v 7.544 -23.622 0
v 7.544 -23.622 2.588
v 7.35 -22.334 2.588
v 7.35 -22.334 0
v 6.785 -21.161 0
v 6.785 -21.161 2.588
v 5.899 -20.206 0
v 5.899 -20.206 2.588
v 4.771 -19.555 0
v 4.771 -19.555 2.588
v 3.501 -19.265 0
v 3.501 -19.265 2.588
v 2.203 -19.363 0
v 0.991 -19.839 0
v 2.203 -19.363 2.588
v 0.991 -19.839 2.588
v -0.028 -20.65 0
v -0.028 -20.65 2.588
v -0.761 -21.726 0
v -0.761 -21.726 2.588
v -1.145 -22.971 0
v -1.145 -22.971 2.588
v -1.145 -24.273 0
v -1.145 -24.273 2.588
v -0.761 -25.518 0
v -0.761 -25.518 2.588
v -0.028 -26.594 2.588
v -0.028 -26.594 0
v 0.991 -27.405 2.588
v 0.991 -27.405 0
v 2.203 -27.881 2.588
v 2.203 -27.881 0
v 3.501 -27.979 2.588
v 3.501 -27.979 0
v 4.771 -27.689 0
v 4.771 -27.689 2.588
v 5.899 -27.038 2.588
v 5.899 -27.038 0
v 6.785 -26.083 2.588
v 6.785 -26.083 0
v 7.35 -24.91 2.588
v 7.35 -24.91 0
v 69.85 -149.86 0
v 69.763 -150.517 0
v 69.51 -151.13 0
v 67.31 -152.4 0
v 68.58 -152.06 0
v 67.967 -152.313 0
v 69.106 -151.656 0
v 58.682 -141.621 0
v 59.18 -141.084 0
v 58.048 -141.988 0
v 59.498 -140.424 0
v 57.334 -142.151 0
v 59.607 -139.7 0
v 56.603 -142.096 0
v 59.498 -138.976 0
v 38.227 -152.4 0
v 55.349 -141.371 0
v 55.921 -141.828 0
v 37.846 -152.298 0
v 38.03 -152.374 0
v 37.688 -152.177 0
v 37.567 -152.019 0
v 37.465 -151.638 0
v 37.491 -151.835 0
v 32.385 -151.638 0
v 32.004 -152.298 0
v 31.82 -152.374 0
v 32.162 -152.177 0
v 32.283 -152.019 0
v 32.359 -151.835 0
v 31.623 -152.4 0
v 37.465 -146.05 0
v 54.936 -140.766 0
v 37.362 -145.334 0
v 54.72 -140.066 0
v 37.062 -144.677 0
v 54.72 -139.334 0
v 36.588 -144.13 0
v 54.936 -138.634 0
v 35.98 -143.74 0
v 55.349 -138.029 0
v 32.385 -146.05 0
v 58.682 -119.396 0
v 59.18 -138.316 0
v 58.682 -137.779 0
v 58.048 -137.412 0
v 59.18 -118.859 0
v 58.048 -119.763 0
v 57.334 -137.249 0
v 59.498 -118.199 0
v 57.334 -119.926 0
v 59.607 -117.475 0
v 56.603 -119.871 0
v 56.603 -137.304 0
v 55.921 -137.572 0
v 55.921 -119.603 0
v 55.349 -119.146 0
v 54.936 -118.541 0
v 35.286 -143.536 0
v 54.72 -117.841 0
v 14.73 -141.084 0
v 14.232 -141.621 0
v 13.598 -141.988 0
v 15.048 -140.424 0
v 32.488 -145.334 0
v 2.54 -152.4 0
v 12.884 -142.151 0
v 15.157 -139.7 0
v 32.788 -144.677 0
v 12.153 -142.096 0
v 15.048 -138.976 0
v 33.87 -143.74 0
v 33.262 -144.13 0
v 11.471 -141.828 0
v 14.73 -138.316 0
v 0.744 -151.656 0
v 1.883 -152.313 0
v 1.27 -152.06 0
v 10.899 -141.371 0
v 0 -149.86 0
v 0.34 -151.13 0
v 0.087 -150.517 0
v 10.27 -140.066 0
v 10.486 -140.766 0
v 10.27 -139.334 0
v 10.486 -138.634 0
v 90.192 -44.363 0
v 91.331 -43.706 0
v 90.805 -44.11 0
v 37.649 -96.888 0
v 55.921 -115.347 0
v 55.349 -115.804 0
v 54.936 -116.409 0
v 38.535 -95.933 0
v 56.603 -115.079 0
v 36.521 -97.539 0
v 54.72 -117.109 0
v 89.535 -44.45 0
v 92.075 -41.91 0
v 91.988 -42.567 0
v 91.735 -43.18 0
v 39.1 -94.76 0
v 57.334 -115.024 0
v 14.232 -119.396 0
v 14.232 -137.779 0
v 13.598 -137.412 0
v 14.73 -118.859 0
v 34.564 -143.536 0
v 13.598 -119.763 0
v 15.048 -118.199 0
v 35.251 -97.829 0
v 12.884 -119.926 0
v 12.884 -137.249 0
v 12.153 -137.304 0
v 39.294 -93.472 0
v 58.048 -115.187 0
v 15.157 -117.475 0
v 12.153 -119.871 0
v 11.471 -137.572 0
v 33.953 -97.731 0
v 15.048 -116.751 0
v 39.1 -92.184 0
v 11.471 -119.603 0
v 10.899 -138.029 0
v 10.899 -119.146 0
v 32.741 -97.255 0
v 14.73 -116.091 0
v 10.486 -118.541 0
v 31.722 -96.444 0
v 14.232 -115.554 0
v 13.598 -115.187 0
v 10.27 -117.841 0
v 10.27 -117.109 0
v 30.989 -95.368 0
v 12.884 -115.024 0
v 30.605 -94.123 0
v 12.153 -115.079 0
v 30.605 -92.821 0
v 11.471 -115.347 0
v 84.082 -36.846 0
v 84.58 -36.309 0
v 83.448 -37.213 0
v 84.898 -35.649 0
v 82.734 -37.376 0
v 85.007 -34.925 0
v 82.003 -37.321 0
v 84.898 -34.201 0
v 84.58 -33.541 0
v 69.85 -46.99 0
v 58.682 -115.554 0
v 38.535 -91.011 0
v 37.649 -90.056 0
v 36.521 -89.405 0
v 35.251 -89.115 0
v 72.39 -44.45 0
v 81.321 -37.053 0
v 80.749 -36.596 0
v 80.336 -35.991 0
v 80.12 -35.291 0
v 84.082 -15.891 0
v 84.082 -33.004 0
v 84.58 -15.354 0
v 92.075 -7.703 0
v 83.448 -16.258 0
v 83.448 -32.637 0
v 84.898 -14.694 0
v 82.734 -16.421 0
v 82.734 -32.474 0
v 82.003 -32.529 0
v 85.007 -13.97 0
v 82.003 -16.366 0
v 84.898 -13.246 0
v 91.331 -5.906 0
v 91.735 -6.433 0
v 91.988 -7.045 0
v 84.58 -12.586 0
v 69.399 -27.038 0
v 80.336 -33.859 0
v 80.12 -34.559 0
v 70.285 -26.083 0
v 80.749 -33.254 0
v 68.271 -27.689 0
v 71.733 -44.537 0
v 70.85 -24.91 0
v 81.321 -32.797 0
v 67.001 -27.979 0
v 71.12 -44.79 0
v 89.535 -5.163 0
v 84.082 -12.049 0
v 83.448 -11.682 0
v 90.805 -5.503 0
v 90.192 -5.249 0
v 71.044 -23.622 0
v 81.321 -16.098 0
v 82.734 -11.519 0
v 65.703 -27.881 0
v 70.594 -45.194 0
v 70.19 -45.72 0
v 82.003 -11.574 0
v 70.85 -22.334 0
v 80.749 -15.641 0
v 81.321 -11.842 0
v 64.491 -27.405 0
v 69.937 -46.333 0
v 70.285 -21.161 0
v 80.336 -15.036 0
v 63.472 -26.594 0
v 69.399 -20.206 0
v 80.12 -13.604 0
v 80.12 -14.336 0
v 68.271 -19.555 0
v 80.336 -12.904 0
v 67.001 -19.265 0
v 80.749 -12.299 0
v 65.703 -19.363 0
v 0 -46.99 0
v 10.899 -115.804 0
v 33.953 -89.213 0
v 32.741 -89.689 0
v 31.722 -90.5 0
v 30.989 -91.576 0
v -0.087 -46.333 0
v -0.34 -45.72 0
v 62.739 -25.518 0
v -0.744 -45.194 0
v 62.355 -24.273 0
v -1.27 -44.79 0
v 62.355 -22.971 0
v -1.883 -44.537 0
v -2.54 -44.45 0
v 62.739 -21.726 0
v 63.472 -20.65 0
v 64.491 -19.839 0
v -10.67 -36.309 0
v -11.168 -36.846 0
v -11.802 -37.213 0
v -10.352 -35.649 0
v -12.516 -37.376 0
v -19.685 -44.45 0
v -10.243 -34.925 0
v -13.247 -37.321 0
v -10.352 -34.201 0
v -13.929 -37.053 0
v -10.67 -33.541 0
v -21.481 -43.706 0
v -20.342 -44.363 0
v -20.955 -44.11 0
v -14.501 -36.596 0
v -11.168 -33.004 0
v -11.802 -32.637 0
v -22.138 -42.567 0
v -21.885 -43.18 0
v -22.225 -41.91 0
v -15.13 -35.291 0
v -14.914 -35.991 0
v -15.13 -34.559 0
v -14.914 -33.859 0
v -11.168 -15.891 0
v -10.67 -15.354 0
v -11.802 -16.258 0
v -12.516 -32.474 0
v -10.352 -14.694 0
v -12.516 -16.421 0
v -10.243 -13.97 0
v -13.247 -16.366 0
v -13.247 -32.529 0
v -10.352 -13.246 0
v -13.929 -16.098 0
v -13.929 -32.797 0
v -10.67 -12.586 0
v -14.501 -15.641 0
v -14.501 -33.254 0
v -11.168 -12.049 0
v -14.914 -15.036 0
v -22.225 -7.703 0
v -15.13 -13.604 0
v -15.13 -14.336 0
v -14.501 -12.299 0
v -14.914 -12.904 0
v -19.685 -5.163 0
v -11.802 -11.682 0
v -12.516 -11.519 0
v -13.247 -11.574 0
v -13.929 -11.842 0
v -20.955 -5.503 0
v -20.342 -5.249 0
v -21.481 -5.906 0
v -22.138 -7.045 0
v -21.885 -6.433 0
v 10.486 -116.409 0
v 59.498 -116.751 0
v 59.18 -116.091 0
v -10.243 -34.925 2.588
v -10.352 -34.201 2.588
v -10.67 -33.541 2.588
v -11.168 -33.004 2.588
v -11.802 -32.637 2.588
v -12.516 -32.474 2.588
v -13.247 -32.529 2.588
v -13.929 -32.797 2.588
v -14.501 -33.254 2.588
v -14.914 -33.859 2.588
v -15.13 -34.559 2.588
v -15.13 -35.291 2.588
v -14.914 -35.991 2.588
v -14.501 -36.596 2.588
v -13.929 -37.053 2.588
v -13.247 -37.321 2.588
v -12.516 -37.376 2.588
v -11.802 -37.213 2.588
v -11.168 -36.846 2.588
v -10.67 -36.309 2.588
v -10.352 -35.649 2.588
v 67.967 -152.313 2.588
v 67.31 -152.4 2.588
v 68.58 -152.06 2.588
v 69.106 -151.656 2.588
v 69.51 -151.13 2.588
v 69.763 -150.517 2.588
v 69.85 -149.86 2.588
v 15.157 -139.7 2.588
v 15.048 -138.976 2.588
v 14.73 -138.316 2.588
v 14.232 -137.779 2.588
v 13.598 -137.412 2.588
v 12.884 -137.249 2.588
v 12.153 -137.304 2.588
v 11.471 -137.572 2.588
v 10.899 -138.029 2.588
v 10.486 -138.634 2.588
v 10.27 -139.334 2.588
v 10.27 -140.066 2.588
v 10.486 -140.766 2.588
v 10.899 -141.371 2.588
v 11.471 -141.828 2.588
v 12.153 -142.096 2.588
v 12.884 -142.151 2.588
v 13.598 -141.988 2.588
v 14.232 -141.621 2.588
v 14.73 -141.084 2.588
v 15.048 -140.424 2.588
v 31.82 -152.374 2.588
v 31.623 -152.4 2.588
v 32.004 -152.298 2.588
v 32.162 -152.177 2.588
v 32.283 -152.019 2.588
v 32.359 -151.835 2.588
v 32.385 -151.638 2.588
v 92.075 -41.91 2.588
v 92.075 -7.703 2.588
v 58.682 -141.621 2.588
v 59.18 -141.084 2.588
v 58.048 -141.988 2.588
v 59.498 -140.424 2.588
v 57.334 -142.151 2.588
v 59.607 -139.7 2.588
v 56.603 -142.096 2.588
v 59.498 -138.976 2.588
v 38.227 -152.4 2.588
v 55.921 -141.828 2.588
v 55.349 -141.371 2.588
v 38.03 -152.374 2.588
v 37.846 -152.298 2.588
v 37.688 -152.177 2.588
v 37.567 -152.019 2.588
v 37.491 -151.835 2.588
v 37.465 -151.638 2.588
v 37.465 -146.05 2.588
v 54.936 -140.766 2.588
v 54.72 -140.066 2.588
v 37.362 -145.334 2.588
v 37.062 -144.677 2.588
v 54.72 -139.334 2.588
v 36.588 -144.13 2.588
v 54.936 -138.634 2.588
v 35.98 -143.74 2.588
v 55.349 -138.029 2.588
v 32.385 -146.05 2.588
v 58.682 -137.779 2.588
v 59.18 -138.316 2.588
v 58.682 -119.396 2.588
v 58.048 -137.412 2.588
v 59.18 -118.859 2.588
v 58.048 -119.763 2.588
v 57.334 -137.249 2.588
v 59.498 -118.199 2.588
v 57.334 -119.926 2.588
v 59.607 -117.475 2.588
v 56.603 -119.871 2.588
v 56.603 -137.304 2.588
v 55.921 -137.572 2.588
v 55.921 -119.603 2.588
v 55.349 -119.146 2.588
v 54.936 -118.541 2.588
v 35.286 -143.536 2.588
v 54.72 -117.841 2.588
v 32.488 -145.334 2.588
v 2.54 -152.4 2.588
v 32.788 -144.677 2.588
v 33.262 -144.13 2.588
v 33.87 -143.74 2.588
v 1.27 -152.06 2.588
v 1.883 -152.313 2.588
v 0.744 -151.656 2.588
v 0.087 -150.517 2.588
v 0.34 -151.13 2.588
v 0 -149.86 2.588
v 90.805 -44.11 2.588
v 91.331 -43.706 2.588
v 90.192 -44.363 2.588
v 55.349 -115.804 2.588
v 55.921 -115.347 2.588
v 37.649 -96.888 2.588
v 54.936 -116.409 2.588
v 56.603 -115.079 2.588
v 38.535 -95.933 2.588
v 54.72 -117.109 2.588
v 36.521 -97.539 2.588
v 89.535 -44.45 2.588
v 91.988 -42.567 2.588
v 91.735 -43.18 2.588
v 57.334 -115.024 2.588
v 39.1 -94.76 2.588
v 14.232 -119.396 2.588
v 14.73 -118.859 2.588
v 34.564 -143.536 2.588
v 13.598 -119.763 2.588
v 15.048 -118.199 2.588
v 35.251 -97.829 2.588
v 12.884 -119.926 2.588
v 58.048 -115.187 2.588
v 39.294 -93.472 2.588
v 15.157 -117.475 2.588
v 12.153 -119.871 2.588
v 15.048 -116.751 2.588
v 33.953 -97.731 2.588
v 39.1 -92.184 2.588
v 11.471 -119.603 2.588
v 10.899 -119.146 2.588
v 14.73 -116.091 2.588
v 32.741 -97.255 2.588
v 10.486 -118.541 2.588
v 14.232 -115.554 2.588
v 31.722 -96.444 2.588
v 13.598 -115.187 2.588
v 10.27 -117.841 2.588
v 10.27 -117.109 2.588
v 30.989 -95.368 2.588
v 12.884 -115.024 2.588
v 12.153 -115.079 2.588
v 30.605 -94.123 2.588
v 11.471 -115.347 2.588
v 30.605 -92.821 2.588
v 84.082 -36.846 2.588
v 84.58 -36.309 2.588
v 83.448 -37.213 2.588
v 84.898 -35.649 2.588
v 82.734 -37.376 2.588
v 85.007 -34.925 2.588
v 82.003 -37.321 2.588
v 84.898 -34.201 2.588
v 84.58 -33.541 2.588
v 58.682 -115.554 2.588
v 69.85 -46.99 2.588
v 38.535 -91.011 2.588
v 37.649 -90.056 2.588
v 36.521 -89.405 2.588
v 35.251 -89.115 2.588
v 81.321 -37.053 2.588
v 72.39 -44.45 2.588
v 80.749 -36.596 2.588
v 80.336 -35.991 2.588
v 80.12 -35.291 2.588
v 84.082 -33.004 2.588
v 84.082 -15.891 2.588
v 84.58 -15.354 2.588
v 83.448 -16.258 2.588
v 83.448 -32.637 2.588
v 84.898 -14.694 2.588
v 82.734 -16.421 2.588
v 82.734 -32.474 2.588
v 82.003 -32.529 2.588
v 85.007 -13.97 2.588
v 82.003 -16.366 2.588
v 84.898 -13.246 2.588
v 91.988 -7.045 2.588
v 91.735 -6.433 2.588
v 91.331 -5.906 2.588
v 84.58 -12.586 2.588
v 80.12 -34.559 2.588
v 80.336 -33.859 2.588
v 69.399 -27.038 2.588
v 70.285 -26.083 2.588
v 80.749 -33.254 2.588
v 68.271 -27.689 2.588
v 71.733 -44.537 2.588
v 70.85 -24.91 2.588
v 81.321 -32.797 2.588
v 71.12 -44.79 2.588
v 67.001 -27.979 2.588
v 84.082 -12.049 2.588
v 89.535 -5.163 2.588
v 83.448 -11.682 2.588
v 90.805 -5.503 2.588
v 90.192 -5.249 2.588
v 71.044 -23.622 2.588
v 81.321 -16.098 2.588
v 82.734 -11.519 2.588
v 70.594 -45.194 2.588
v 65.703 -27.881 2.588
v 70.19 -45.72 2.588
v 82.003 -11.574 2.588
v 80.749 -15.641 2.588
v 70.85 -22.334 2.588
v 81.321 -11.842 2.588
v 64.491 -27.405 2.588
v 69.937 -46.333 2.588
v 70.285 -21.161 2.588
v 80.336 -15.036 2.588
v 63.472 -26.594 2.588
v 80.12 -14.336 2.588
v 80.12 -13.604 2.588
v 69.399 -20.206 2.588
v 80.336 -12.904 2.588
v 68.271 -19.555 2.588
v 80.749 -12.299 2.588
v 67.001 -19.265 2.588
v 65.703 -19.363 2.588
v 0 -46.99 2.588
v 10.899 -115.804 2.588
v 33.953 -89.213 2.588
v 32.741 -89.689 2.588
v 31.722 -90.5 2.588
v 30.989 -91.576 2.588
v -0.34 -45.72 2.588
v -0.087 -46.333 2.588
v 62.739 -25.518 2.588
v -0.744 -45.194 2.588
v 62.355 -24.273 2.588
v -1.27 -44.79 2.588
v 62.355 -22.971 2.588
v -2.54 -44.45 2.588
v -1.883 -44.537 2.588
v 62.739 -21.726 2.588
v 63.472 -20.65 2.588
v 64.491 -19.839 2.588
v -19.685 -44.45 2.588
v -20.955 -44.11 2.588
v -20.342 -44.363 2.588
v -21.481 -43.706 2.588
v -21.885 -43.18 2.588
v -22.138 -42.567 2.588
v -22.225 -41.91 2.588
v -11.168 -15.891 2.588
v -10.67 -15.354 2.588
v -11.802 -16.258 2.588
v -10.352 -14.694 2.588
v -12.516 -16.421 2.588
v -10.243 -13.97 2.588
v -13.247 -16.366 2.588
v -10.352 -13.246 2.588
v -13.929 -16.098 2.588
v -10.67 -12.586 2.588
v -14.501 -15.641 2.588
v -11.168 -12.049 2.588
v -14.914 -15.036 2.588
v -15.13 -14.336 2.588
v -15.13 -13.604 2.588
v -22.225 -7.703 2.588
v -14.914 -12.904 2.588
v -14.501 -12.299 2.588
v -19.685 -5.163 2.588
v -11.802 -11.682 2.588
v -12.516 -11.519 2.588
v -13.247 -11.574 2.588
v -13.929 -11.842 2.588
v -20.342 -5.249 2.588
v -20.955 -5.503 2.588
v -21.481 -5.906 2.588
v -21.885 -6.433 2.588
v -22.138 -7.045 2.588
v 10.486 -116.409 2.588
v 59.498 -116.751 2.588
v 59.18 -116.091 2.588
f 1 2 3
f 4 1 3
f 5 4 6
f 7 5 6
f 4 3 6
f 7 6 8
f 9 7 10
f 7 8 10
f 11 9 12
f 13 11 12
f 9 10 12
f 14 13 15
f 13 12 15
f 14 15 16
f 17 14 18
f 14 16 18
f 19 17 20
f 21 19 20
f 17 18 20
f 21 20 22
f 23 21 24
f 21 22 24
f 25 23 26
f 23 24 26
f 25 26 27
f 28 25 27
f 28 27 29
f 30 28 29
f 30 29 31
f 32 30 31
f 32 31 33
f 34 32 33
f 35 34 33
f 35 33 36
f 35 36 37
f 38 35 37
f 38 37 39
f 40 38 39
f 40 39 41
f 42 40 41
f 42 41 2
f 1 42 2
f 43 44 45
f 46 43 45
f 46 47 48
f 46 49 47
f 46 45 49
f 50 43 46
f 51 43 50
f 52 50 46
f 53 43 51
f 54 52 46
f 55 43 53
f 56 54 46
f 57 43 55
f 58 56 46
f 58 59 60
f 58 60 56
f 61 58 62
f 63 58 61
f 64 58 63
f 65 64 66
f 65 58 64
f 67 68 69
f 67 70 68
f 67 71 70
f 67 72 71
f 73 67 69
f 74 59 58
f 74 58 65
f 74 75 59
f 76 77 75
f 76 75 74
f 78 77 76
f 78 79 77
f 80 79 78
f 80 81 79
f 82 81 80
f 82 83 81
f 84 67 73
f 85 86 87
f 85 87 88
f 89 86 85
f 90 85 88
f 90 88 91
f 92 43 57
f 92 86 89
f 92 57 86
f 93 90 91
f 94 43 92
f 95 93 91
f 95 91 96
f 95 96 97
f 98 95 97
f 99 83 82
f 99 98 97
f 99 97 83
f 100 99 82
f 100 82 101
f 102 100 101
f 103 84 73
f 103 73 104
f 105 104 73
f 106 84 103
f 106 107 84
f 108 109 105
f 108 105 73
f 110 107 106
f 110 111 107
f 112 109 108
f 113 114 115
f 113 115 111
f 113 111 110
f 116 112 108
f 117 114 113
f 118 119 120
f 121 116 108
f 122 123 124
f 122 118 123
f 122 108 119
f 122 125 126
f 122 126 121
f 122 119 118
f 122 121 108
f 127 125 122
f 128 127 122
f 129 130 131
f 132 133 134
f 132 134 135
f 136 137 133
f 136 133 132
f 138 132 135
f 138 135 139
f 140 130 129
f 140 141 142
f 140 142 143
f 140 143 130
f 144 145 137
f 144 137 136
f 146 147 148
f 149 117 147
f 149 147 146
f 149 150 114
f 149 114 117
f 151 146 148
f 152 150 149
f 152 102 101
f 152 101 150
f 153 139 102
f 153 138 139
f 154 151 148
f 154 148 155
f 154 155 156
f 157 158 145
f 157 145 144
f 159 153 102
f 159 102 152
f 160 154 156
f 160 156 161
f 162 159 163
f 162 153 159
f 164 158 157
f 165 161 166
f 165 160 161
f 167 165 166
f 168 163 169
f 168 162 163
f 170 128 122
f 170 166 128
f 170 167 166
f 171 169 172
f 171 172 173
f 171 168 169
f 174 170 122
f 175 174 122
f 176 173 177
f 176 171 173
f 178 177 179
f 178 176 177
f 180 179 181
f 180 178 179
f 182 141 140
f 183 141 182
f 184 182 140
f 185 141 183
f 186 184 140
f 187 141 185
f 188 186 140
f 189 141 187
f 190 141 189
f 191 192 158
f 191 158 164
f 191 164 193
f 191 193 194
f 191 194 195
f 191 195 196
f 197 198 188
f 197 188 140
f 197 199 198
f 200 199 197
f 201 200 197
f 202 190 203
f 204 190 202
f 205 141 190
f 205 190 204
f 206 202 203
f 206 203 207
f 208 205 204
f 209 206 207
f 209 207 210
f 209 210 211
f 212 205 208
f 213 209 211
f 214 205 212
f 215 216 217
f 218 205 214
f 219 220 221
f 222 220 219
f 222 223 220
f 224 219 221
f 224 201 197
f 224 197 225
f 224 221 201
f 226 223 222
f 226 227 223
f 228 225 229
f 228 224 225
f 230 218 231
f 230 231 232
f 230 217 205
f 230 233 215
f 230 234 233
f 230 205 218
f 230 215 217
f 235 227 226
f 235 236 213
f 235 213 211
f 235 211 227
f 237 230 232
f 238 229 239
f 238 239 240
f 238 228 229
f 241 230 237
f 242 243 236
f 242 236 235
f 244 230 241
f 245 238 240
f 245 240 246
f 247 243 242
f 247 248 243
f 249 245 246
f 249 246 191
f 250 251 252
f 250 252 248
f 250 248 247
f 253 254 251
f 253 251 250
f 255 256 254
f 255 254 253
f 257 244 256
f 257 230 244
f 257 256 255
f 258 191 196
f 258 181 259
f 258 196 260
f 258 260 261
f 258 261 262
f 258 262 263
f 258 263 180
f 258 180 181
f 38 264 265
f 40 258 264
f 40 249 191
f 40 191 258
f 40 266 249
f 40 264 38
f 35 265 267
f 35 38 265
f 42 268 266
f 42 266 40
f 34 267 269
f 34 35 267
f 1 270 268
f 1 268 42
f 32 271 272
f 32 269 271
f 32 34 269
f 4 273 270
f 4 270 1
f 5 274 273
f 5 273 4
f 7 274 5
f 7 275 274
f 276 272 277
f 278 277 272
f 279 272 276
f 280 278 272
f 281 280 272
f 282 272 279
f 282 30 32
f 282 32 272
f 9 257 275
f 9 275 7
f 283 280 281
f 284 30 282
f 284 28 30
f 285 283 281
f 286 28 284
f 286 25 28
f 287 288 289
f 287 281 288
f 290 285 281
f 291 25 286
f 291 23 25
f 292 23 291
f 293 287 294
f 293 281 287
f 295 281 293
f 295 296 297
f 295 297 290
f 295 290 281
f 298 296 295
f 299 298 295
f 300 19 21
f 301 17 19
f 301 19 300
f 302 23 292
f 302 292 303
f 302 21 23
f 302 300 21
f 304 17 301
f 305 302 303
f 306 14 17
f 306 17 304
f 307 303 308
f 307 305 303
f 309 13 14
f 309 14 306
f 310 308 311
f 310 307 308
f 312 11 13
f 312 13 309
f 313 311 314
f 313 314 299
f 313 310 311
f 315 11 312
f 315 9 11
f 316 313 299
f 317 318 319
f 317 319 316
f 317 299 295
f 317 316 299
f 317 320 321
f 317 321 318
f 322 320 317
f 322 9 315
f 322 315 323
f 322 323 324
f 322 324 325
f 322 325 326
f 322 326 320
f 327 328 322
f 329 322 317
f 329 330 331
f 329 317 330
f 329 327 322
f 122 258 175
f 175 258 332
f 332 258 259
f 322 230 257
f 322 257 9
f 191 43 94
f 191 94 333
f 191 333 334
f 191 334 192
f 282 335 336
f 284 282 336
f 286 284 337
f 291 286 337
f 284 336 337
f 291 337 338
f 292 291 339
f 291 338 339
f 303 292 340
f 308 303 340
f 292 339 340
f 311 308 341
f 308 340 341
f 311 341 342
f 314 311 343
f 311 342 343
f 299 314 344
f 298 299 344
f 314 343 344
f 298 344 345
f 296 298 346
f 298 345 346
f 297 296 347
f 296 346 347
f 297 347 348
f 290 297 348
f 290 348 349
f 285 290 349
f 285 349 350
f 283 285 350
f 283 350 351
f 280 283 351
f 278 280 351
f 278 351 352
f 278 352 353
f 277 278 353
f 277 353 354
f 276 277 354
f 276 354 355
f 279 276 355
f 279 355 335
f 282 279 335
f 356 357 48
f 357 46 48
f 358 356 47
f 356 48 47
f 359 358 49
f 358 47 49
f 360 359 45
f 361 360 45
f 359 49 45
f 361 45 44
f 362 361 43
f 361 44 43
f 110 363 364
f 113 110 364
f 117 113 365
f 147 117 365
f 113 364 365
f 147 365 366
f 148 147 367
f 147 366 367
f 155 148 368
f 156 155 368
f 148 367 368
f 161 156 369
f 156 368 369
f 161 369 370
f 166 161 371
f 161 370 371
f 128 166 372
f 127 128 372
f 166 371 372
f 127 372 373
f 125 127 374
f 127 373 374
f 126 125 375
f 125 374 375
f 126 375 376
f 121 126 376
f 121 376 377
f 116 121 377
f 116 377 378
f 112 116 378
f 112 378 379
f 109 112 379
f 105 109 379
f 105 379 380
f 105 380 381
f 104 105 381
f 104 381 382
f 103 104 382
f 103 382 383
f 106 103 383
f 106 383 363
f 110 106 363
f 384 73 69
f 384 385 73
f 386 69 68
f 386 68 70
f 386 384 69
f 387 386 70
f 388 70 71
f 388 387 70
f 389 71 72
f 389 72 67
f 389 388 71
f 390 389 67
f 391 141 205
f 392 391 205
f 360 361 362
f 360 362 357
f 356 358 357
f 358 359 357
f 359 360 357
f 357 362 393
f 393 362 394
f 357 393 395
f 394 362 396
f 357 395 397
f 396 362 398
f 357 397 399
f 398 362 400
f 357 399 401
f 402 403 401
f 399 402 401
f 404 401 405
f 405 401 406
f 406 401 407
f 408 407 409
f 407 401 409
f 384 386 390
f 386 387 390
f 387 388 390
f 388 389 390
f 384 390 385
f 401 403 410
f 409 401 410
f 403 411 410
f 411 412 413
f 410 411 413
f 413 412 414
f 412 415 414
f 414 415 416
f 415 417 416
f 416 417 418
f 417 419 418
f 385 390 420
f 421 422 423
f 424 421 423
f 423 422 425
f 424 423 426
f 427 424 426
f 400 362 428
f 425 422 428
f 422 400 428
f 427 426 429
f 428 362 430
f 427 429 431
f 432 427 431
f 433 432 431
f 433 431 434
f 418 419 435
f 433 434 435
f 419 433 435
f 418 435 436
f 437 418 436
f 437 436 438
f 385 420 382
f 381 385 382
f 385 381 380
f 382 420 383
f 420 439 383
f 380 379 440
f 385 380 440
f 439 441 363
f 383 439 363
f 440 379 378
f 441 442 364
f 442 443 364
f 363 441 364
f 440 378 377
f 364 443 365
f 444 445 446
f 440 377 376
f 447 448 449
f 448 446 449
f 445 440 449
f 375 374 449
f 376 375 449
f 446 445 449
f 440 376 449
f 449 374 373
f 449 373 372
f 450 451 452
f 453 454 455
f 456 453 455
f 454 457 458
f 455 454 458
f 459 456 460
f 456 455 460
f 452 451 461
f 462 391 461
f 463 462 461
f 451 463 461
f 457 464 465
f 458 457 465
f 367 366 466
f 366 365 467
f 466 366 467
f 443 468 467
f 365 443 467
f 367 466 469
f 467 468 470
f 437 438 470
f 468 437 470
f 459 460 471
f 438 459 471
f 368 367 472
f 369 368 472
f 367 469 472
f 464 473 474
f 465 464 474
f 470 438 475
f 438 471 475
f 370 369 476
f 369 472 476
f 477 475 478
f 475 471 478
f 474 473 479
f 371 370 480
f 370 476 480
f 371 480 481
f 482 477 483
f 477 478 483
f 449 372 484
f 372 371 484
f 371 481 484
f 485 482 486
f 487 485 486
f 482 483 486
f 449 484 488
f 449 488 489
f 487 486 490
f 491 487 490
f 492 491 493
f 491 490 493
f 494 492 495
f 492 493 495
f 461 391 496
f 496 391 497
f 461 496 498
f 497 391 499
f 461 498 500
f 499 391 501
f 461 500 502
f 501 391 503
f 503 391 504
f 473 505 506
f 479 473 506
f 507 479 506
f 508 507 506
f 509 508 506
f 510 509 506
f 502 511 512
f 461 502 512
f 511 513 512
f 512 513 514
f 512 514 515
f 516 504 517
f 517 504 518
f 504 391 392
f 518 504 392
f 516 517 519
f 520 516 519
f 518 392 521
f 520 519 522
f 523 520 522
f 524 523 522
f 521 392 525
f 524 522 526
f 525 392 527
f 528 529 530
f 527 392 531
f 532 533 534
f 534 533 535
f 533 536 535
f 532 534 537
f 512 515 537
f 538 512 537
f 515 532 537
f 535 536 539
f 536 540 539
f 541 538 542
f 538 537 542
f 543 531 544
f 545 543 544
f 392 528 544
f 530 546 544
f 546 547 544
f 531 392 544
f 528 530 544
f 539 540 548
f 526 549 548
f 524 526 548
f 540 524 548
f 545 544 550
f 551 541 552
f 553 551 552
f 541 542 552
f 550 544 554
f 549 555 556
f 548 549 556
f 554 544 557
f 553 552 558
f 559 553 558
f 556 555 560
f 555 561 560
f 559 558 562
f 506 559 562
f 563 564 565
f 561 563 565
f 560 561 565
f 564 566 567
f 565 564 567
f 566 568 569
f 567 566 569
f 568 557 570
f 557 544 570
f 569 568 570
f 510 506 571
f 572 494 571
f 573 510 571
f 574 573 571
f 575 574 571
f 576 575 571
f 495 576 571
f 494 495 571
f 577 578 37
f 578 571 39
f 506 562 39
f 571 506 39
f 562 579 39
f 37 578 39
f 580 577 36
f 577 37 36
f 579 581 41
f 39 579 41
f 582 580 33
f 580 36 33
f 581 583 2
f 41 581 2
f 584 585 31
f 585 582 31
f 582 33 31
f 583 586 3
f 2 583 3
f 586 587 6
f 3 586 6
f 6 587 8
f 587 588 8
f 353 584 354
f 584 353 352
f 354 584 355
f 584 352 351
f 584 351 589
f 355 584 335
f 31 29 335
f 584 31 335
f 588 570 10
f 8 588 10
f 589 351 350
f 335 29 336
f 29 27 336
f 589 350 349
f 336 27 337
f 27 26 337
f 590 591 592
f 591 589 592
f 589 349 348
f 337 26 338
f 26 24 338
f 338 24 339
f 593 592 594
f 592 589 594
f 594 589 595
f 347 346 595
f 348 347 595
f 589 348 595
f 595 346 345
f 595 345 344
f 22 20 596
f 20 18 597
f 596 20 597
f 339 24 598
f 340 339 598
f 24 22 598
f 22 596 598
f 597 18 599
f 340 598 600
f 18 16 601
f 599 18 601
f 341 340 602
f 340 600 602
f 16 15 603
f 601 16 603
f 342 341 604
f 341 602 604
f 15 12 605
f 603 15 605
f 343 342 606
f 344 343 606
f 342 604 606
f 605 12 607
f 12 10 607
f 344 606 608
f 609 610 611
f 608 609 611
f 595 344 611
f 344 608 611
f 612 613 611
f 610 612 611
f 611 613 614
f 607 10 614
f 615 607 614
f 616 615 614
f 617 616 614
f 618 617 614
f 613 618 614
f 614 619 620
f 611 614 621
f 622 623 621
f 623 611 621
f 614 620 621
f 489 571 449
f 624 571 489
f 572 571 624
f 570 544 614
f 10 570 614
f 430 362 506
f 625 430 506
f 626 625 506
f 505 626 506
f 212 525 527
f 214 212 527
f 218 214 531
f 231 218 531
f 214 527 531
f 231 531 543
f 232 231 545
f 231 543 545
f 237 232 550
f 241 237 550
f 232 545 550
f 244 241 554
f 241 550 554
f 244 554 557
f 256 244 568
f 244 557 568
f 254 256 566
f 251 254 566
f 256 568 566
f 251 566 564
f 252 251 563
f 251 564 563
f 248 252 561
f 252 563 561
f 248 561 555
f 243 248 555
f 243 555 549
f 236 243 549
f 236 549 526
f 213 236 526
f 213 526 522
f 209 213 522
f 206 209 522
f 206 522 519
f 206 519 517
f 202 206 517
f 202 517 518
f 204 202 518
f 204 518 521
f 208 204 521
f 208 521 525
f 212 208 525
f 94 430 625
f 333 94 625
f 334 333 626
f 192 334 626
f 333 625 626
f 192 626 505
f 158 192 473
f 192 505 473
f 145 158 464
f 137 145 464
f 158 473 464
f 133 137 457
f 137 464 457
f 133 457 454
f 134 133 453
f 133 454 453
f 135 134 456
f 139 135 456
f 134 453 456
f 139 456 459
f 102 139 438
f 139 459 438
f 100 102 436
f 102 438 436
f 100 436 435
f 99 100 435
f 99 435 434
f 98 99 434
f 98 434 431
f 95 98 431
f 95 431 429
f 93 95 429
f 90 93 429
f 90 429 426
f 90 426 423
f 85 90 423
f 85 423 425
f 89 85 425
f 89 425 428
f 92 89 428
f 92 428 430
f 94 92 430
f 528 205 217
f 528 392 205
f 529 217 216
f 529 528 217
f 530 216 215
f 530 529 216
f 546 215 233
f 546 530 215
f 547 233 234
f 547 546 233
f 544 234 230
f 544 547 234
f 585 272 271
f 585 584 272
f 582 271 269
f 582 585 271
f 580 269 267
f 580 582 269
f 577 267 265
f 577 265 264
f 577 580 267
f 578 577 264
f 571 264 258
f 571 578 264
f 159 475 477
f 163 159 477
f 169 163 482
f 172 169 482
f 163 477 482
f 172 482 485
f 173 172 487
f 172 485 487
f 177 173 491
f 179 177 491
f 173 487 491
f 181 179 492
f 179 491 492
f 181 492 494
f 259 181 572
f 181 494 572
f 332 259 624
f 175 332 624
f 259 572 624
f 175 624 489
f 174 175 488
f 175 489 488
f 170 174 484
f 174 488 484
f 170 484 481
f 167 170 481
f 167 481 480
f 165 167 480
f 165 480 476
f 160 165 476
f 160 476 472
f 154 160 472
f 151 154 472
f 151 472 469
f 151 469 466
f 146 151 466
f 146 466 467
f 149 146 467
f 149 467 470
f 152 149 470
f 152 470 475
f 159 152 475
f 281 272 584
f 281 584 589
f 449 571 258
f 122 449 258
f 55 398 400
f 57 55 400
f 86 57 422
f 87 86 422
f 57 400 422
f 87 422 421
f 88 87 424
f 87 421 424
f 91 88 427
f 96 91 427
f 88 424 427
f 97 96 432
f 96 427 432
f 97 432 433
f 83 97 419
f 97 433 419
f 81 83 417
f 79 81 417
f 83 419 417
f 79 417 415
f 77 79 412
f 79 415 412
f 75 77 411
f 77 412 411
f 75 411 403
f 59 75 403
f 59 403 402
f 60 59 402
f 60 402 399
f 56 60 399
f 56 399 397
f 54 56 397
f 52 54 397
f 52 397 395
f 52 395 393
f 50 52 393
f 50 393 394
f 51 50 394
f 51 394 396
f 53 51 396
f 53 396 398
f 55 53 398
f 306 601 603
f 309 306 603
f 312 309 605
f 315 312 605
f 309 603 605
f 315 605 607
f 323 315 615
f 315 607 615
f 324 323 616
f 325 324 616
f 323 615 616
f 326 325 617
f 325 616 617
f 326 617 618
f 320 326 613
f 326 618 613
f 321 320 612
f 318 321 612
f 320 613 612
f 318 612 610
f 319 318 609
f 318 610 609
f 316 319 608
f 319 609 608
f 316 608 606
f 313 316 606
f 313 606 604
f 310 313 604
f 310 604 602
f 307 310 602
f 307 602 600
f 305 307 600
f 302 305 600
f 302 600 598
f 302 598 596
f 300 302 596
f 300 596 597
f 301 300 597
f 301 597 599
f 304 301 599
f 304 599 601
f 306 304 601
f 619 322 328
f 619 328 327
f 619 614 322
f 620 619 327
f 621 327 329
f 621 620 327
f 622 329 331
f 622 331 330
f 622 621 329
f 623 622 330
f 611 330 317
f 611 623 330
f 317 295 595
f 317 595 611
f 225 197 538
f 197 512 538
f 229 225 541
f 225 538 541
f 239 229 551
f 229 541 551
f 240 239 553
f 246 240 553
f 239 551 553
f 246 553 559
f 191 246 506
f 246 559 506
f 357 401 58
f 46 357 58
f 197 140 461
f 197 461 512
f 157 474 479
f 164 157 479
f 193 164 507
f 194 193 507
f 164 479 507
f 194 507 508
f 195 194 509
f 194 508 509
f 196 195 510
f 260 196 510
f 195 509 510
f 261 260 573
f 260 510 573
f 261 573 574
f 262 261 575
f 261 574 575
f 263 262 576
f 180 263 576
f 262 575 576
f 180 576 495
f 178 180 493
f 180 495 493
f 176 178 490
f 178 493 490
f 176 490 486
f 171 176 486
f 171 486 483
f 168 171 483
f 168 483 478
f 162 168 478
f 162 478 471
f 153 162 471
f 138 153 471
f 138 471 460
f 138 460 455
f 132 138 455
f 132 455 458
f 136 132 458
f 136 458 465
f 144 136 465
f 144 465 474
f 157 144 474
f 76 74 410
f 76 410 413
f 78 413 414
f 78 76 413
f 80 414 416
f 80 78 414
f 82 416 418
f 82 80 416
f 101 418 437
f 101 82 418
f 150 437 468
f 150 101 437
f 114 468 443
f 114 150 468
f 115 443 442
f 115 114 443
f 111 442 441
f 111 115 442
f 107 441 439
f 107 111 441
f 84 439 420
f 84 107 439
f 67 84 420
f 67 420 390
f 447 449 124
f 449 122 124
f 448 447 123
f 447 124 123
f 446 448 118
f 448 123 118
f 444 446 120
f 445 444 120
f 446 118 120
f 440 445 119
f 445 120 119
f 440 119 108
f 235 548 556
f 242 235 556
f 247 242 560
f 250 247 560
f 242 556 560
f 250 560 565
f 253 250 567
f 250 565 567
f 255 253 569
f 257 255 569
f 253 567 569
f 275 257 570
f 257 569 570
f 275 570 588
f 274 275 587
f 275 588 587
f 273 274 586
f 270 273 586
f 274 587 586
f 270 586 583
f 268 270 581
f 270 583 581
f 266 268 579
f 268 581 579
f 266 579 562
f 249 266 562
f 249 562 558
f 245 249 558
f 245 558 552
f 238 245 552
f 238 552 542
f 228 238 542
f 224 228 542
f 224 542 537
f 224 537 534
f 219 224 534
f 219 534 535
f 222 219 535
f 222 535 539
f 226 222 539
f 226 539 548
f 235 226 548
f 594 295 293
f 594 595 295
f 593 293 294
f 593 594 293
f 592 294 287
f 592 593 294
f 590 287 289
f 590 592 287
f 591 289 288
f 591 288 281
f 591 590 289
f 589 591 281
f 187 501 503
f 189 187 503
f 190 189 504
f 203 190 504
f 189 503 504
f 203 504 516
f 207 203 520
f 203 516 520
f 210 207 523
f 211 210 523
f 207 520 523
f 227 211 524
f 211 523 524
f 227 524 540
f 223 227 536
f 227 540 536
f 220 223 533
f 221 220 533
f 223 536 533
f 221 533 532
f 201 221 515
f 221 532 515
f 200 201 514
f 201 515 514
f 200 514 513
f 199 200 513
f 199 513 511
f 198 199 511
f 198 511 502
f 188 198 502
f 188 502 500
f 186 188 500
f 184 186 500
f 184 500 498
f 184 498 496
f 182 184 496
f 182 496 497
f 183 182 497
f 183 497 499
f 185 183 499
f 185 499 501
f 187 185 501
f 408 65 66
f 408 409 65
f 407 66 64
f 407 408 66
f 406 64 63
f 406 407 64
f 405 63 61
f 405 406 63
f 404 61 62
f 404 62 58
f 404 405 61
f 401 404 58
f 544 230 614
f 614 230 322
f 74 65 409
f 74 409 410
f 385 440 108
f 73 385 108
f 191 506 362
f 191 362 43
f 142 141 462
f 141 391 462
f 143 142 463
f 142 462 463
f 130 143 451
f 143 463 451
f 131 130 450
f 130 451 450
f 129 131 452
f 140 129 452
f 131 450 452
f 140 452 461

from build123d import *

# Parameters (mm, degrees)
SKETCH1_W                                 = 2.58826
SKETCH1_H                                 = 152.4
BASE_FLANGE1_DEPTH                        = 69.85
SKETCH2_W                                 = 22.225
SKETCH2_H                                 = 44.45
BOSS_EXTRUDE1_DEPTH                       = 2.58826
F_10_0_1935_DIAMETER_HOLE1_D              = 4.9149
SKETCH5_W                                 = 114.3
SKETCH5_H                                 = 5.16255
CUT_EXTRUDE1_DEPTH                        = 179.073762006
FILLET1_R                                 = 2.54
HOLE_FOR_1_4_SELF_CLINCHING_NUTS_S_SS_C_D = 8.7376
CUT_EXTRUDE2_DEPTH                        = 179.073762006
FILLET2_R                                 = 0.762


# Sheet-metal steps are written as plain solids
with BuildPart() as part:
    # Sketch1 → Base-Flange1 (new body)
    with BuildSketch(Plane(origin=(0, 0, 0), x_dir=(0, 0, -1), z_dir=(1, 0, 0))):
        with Locations((-1.29413, -76.2)):
            Rectangle(SKETCH1_W, SKETCH1_H)
    extrude(amount=BASE_FLANGE1_DEPTH)

    # Sketch2 → Boss-Extrude1 (add)
    with BuildSketch(Plane(origin=(0, 0, 0), x_dir=(-1, 0, 0), z_dir=(0, 0, -1))):
        with Locations((-80.9625, -22.225)):
            Rectangle(SKETCH2_W, SKETCH2_H)
        with Locations((11.1125, -22.225)):
            Rectangle(SKETCH2_W, SKETCH2_H)
    extrude(amount=-BOSS_EXTRUDE1_DEPTH)

    # #10 (0.1935) Diameter Hole1 (through all)
    with Locations(Plane(origin=(0, 0, 0), x_dir=(-1, 0, 0), z_dir=(0, 0, -1))):
        with Locations((-82.55, -13.97), (-82.55, -34.925), (12.7, -34.925), (12.7, -13.97), (-57.15, -117.475), (-57.15, -139.7), (-12.7, -139.7), (-12.7, -117.475)):
            Hole(F_10_0_1935_DIAMETER_HOLE1_D / 2)

    # Sketch5 → Cut-Extrude1 (cut, through all)
    with BuildSketch(Plane(origin=(0, 0, 0), x_dir=(-1, 0, 0), z_dir=(0, 0, -1))):
        with Locations((-34.925, -2.581275)):
            Rectangle(SKETCH5_W, SKETCH5_H)
    extrude(amount=-CUT_EXTRUDE1_DEPTH, mode=Mode.SUBTRACT)

    # Fillet1
    fillet1_edges = [part.edges().sort_by_distance(p)[0] for p in [
        (92.075, -44.45, 1.29413),
        (69.85, -44.45, 1.29413),
        (69.85, -152.4, 1.29413),
        (0, -44.45, 1.29413),
        (-22.225, -44.45, 1.29413),
        (0, -152.4, 1.29413),
        (92.075, -5.16255, 1.29413),
        (-22.225, -5.16255, 1.29413),
    ]]
    fillet(fillet1_edges, radius=FILLET1_R)

    # Hole for 1/4 Self-clinching Nuts (S,SS,CLS,CLSS)1 (through all)
    with Locations(Plane(origin=(0, 0, 0), x_dir=(-1, 0, 0), z_dir=(0, 0, -1))):
        with Locations((-66.675, -23.622), (-3.175, -23.622), (-34.925, -93.472)):
            Hole(HOLE_FOR_1_4_SELF_CLINCHING_NUTS_S_SS_C_D / 2)

    # Sketch8 → Cut-Extrude2 (cut, through all)
    with BuildSketch(Plane(origin=(0, 0, 0), x_dir=(-1, 0, 0), z_dir=(0, 0, -1))):
        with BuildLine():
            Line((-37.465, -152.4), (-37.465, -146.05))
            ThreePointArc((-37.465, -146.05), (-34.925, -143.51), (-32.385, -146.05))
            Line((-32.385, -146.05), (-32.385, -152.4))
            Line((-32.385, -152.4), (-37.465, -152.4))
        make_face()
    extrude(amount=-CUT_EXTRUDE2_DEPTH, mode=Mode.SUBTRACT)

    # Fillet2
    fillet2_edges = [part.edges().sort_by_distance(p)[0] for p in [
        (32.385, -152.4, 1.29413),
        (37.465, -152.4, 1.29413),
    ]]
    fillet(fillet2_edges, radius=FILLET2_R)


solid = part.part
